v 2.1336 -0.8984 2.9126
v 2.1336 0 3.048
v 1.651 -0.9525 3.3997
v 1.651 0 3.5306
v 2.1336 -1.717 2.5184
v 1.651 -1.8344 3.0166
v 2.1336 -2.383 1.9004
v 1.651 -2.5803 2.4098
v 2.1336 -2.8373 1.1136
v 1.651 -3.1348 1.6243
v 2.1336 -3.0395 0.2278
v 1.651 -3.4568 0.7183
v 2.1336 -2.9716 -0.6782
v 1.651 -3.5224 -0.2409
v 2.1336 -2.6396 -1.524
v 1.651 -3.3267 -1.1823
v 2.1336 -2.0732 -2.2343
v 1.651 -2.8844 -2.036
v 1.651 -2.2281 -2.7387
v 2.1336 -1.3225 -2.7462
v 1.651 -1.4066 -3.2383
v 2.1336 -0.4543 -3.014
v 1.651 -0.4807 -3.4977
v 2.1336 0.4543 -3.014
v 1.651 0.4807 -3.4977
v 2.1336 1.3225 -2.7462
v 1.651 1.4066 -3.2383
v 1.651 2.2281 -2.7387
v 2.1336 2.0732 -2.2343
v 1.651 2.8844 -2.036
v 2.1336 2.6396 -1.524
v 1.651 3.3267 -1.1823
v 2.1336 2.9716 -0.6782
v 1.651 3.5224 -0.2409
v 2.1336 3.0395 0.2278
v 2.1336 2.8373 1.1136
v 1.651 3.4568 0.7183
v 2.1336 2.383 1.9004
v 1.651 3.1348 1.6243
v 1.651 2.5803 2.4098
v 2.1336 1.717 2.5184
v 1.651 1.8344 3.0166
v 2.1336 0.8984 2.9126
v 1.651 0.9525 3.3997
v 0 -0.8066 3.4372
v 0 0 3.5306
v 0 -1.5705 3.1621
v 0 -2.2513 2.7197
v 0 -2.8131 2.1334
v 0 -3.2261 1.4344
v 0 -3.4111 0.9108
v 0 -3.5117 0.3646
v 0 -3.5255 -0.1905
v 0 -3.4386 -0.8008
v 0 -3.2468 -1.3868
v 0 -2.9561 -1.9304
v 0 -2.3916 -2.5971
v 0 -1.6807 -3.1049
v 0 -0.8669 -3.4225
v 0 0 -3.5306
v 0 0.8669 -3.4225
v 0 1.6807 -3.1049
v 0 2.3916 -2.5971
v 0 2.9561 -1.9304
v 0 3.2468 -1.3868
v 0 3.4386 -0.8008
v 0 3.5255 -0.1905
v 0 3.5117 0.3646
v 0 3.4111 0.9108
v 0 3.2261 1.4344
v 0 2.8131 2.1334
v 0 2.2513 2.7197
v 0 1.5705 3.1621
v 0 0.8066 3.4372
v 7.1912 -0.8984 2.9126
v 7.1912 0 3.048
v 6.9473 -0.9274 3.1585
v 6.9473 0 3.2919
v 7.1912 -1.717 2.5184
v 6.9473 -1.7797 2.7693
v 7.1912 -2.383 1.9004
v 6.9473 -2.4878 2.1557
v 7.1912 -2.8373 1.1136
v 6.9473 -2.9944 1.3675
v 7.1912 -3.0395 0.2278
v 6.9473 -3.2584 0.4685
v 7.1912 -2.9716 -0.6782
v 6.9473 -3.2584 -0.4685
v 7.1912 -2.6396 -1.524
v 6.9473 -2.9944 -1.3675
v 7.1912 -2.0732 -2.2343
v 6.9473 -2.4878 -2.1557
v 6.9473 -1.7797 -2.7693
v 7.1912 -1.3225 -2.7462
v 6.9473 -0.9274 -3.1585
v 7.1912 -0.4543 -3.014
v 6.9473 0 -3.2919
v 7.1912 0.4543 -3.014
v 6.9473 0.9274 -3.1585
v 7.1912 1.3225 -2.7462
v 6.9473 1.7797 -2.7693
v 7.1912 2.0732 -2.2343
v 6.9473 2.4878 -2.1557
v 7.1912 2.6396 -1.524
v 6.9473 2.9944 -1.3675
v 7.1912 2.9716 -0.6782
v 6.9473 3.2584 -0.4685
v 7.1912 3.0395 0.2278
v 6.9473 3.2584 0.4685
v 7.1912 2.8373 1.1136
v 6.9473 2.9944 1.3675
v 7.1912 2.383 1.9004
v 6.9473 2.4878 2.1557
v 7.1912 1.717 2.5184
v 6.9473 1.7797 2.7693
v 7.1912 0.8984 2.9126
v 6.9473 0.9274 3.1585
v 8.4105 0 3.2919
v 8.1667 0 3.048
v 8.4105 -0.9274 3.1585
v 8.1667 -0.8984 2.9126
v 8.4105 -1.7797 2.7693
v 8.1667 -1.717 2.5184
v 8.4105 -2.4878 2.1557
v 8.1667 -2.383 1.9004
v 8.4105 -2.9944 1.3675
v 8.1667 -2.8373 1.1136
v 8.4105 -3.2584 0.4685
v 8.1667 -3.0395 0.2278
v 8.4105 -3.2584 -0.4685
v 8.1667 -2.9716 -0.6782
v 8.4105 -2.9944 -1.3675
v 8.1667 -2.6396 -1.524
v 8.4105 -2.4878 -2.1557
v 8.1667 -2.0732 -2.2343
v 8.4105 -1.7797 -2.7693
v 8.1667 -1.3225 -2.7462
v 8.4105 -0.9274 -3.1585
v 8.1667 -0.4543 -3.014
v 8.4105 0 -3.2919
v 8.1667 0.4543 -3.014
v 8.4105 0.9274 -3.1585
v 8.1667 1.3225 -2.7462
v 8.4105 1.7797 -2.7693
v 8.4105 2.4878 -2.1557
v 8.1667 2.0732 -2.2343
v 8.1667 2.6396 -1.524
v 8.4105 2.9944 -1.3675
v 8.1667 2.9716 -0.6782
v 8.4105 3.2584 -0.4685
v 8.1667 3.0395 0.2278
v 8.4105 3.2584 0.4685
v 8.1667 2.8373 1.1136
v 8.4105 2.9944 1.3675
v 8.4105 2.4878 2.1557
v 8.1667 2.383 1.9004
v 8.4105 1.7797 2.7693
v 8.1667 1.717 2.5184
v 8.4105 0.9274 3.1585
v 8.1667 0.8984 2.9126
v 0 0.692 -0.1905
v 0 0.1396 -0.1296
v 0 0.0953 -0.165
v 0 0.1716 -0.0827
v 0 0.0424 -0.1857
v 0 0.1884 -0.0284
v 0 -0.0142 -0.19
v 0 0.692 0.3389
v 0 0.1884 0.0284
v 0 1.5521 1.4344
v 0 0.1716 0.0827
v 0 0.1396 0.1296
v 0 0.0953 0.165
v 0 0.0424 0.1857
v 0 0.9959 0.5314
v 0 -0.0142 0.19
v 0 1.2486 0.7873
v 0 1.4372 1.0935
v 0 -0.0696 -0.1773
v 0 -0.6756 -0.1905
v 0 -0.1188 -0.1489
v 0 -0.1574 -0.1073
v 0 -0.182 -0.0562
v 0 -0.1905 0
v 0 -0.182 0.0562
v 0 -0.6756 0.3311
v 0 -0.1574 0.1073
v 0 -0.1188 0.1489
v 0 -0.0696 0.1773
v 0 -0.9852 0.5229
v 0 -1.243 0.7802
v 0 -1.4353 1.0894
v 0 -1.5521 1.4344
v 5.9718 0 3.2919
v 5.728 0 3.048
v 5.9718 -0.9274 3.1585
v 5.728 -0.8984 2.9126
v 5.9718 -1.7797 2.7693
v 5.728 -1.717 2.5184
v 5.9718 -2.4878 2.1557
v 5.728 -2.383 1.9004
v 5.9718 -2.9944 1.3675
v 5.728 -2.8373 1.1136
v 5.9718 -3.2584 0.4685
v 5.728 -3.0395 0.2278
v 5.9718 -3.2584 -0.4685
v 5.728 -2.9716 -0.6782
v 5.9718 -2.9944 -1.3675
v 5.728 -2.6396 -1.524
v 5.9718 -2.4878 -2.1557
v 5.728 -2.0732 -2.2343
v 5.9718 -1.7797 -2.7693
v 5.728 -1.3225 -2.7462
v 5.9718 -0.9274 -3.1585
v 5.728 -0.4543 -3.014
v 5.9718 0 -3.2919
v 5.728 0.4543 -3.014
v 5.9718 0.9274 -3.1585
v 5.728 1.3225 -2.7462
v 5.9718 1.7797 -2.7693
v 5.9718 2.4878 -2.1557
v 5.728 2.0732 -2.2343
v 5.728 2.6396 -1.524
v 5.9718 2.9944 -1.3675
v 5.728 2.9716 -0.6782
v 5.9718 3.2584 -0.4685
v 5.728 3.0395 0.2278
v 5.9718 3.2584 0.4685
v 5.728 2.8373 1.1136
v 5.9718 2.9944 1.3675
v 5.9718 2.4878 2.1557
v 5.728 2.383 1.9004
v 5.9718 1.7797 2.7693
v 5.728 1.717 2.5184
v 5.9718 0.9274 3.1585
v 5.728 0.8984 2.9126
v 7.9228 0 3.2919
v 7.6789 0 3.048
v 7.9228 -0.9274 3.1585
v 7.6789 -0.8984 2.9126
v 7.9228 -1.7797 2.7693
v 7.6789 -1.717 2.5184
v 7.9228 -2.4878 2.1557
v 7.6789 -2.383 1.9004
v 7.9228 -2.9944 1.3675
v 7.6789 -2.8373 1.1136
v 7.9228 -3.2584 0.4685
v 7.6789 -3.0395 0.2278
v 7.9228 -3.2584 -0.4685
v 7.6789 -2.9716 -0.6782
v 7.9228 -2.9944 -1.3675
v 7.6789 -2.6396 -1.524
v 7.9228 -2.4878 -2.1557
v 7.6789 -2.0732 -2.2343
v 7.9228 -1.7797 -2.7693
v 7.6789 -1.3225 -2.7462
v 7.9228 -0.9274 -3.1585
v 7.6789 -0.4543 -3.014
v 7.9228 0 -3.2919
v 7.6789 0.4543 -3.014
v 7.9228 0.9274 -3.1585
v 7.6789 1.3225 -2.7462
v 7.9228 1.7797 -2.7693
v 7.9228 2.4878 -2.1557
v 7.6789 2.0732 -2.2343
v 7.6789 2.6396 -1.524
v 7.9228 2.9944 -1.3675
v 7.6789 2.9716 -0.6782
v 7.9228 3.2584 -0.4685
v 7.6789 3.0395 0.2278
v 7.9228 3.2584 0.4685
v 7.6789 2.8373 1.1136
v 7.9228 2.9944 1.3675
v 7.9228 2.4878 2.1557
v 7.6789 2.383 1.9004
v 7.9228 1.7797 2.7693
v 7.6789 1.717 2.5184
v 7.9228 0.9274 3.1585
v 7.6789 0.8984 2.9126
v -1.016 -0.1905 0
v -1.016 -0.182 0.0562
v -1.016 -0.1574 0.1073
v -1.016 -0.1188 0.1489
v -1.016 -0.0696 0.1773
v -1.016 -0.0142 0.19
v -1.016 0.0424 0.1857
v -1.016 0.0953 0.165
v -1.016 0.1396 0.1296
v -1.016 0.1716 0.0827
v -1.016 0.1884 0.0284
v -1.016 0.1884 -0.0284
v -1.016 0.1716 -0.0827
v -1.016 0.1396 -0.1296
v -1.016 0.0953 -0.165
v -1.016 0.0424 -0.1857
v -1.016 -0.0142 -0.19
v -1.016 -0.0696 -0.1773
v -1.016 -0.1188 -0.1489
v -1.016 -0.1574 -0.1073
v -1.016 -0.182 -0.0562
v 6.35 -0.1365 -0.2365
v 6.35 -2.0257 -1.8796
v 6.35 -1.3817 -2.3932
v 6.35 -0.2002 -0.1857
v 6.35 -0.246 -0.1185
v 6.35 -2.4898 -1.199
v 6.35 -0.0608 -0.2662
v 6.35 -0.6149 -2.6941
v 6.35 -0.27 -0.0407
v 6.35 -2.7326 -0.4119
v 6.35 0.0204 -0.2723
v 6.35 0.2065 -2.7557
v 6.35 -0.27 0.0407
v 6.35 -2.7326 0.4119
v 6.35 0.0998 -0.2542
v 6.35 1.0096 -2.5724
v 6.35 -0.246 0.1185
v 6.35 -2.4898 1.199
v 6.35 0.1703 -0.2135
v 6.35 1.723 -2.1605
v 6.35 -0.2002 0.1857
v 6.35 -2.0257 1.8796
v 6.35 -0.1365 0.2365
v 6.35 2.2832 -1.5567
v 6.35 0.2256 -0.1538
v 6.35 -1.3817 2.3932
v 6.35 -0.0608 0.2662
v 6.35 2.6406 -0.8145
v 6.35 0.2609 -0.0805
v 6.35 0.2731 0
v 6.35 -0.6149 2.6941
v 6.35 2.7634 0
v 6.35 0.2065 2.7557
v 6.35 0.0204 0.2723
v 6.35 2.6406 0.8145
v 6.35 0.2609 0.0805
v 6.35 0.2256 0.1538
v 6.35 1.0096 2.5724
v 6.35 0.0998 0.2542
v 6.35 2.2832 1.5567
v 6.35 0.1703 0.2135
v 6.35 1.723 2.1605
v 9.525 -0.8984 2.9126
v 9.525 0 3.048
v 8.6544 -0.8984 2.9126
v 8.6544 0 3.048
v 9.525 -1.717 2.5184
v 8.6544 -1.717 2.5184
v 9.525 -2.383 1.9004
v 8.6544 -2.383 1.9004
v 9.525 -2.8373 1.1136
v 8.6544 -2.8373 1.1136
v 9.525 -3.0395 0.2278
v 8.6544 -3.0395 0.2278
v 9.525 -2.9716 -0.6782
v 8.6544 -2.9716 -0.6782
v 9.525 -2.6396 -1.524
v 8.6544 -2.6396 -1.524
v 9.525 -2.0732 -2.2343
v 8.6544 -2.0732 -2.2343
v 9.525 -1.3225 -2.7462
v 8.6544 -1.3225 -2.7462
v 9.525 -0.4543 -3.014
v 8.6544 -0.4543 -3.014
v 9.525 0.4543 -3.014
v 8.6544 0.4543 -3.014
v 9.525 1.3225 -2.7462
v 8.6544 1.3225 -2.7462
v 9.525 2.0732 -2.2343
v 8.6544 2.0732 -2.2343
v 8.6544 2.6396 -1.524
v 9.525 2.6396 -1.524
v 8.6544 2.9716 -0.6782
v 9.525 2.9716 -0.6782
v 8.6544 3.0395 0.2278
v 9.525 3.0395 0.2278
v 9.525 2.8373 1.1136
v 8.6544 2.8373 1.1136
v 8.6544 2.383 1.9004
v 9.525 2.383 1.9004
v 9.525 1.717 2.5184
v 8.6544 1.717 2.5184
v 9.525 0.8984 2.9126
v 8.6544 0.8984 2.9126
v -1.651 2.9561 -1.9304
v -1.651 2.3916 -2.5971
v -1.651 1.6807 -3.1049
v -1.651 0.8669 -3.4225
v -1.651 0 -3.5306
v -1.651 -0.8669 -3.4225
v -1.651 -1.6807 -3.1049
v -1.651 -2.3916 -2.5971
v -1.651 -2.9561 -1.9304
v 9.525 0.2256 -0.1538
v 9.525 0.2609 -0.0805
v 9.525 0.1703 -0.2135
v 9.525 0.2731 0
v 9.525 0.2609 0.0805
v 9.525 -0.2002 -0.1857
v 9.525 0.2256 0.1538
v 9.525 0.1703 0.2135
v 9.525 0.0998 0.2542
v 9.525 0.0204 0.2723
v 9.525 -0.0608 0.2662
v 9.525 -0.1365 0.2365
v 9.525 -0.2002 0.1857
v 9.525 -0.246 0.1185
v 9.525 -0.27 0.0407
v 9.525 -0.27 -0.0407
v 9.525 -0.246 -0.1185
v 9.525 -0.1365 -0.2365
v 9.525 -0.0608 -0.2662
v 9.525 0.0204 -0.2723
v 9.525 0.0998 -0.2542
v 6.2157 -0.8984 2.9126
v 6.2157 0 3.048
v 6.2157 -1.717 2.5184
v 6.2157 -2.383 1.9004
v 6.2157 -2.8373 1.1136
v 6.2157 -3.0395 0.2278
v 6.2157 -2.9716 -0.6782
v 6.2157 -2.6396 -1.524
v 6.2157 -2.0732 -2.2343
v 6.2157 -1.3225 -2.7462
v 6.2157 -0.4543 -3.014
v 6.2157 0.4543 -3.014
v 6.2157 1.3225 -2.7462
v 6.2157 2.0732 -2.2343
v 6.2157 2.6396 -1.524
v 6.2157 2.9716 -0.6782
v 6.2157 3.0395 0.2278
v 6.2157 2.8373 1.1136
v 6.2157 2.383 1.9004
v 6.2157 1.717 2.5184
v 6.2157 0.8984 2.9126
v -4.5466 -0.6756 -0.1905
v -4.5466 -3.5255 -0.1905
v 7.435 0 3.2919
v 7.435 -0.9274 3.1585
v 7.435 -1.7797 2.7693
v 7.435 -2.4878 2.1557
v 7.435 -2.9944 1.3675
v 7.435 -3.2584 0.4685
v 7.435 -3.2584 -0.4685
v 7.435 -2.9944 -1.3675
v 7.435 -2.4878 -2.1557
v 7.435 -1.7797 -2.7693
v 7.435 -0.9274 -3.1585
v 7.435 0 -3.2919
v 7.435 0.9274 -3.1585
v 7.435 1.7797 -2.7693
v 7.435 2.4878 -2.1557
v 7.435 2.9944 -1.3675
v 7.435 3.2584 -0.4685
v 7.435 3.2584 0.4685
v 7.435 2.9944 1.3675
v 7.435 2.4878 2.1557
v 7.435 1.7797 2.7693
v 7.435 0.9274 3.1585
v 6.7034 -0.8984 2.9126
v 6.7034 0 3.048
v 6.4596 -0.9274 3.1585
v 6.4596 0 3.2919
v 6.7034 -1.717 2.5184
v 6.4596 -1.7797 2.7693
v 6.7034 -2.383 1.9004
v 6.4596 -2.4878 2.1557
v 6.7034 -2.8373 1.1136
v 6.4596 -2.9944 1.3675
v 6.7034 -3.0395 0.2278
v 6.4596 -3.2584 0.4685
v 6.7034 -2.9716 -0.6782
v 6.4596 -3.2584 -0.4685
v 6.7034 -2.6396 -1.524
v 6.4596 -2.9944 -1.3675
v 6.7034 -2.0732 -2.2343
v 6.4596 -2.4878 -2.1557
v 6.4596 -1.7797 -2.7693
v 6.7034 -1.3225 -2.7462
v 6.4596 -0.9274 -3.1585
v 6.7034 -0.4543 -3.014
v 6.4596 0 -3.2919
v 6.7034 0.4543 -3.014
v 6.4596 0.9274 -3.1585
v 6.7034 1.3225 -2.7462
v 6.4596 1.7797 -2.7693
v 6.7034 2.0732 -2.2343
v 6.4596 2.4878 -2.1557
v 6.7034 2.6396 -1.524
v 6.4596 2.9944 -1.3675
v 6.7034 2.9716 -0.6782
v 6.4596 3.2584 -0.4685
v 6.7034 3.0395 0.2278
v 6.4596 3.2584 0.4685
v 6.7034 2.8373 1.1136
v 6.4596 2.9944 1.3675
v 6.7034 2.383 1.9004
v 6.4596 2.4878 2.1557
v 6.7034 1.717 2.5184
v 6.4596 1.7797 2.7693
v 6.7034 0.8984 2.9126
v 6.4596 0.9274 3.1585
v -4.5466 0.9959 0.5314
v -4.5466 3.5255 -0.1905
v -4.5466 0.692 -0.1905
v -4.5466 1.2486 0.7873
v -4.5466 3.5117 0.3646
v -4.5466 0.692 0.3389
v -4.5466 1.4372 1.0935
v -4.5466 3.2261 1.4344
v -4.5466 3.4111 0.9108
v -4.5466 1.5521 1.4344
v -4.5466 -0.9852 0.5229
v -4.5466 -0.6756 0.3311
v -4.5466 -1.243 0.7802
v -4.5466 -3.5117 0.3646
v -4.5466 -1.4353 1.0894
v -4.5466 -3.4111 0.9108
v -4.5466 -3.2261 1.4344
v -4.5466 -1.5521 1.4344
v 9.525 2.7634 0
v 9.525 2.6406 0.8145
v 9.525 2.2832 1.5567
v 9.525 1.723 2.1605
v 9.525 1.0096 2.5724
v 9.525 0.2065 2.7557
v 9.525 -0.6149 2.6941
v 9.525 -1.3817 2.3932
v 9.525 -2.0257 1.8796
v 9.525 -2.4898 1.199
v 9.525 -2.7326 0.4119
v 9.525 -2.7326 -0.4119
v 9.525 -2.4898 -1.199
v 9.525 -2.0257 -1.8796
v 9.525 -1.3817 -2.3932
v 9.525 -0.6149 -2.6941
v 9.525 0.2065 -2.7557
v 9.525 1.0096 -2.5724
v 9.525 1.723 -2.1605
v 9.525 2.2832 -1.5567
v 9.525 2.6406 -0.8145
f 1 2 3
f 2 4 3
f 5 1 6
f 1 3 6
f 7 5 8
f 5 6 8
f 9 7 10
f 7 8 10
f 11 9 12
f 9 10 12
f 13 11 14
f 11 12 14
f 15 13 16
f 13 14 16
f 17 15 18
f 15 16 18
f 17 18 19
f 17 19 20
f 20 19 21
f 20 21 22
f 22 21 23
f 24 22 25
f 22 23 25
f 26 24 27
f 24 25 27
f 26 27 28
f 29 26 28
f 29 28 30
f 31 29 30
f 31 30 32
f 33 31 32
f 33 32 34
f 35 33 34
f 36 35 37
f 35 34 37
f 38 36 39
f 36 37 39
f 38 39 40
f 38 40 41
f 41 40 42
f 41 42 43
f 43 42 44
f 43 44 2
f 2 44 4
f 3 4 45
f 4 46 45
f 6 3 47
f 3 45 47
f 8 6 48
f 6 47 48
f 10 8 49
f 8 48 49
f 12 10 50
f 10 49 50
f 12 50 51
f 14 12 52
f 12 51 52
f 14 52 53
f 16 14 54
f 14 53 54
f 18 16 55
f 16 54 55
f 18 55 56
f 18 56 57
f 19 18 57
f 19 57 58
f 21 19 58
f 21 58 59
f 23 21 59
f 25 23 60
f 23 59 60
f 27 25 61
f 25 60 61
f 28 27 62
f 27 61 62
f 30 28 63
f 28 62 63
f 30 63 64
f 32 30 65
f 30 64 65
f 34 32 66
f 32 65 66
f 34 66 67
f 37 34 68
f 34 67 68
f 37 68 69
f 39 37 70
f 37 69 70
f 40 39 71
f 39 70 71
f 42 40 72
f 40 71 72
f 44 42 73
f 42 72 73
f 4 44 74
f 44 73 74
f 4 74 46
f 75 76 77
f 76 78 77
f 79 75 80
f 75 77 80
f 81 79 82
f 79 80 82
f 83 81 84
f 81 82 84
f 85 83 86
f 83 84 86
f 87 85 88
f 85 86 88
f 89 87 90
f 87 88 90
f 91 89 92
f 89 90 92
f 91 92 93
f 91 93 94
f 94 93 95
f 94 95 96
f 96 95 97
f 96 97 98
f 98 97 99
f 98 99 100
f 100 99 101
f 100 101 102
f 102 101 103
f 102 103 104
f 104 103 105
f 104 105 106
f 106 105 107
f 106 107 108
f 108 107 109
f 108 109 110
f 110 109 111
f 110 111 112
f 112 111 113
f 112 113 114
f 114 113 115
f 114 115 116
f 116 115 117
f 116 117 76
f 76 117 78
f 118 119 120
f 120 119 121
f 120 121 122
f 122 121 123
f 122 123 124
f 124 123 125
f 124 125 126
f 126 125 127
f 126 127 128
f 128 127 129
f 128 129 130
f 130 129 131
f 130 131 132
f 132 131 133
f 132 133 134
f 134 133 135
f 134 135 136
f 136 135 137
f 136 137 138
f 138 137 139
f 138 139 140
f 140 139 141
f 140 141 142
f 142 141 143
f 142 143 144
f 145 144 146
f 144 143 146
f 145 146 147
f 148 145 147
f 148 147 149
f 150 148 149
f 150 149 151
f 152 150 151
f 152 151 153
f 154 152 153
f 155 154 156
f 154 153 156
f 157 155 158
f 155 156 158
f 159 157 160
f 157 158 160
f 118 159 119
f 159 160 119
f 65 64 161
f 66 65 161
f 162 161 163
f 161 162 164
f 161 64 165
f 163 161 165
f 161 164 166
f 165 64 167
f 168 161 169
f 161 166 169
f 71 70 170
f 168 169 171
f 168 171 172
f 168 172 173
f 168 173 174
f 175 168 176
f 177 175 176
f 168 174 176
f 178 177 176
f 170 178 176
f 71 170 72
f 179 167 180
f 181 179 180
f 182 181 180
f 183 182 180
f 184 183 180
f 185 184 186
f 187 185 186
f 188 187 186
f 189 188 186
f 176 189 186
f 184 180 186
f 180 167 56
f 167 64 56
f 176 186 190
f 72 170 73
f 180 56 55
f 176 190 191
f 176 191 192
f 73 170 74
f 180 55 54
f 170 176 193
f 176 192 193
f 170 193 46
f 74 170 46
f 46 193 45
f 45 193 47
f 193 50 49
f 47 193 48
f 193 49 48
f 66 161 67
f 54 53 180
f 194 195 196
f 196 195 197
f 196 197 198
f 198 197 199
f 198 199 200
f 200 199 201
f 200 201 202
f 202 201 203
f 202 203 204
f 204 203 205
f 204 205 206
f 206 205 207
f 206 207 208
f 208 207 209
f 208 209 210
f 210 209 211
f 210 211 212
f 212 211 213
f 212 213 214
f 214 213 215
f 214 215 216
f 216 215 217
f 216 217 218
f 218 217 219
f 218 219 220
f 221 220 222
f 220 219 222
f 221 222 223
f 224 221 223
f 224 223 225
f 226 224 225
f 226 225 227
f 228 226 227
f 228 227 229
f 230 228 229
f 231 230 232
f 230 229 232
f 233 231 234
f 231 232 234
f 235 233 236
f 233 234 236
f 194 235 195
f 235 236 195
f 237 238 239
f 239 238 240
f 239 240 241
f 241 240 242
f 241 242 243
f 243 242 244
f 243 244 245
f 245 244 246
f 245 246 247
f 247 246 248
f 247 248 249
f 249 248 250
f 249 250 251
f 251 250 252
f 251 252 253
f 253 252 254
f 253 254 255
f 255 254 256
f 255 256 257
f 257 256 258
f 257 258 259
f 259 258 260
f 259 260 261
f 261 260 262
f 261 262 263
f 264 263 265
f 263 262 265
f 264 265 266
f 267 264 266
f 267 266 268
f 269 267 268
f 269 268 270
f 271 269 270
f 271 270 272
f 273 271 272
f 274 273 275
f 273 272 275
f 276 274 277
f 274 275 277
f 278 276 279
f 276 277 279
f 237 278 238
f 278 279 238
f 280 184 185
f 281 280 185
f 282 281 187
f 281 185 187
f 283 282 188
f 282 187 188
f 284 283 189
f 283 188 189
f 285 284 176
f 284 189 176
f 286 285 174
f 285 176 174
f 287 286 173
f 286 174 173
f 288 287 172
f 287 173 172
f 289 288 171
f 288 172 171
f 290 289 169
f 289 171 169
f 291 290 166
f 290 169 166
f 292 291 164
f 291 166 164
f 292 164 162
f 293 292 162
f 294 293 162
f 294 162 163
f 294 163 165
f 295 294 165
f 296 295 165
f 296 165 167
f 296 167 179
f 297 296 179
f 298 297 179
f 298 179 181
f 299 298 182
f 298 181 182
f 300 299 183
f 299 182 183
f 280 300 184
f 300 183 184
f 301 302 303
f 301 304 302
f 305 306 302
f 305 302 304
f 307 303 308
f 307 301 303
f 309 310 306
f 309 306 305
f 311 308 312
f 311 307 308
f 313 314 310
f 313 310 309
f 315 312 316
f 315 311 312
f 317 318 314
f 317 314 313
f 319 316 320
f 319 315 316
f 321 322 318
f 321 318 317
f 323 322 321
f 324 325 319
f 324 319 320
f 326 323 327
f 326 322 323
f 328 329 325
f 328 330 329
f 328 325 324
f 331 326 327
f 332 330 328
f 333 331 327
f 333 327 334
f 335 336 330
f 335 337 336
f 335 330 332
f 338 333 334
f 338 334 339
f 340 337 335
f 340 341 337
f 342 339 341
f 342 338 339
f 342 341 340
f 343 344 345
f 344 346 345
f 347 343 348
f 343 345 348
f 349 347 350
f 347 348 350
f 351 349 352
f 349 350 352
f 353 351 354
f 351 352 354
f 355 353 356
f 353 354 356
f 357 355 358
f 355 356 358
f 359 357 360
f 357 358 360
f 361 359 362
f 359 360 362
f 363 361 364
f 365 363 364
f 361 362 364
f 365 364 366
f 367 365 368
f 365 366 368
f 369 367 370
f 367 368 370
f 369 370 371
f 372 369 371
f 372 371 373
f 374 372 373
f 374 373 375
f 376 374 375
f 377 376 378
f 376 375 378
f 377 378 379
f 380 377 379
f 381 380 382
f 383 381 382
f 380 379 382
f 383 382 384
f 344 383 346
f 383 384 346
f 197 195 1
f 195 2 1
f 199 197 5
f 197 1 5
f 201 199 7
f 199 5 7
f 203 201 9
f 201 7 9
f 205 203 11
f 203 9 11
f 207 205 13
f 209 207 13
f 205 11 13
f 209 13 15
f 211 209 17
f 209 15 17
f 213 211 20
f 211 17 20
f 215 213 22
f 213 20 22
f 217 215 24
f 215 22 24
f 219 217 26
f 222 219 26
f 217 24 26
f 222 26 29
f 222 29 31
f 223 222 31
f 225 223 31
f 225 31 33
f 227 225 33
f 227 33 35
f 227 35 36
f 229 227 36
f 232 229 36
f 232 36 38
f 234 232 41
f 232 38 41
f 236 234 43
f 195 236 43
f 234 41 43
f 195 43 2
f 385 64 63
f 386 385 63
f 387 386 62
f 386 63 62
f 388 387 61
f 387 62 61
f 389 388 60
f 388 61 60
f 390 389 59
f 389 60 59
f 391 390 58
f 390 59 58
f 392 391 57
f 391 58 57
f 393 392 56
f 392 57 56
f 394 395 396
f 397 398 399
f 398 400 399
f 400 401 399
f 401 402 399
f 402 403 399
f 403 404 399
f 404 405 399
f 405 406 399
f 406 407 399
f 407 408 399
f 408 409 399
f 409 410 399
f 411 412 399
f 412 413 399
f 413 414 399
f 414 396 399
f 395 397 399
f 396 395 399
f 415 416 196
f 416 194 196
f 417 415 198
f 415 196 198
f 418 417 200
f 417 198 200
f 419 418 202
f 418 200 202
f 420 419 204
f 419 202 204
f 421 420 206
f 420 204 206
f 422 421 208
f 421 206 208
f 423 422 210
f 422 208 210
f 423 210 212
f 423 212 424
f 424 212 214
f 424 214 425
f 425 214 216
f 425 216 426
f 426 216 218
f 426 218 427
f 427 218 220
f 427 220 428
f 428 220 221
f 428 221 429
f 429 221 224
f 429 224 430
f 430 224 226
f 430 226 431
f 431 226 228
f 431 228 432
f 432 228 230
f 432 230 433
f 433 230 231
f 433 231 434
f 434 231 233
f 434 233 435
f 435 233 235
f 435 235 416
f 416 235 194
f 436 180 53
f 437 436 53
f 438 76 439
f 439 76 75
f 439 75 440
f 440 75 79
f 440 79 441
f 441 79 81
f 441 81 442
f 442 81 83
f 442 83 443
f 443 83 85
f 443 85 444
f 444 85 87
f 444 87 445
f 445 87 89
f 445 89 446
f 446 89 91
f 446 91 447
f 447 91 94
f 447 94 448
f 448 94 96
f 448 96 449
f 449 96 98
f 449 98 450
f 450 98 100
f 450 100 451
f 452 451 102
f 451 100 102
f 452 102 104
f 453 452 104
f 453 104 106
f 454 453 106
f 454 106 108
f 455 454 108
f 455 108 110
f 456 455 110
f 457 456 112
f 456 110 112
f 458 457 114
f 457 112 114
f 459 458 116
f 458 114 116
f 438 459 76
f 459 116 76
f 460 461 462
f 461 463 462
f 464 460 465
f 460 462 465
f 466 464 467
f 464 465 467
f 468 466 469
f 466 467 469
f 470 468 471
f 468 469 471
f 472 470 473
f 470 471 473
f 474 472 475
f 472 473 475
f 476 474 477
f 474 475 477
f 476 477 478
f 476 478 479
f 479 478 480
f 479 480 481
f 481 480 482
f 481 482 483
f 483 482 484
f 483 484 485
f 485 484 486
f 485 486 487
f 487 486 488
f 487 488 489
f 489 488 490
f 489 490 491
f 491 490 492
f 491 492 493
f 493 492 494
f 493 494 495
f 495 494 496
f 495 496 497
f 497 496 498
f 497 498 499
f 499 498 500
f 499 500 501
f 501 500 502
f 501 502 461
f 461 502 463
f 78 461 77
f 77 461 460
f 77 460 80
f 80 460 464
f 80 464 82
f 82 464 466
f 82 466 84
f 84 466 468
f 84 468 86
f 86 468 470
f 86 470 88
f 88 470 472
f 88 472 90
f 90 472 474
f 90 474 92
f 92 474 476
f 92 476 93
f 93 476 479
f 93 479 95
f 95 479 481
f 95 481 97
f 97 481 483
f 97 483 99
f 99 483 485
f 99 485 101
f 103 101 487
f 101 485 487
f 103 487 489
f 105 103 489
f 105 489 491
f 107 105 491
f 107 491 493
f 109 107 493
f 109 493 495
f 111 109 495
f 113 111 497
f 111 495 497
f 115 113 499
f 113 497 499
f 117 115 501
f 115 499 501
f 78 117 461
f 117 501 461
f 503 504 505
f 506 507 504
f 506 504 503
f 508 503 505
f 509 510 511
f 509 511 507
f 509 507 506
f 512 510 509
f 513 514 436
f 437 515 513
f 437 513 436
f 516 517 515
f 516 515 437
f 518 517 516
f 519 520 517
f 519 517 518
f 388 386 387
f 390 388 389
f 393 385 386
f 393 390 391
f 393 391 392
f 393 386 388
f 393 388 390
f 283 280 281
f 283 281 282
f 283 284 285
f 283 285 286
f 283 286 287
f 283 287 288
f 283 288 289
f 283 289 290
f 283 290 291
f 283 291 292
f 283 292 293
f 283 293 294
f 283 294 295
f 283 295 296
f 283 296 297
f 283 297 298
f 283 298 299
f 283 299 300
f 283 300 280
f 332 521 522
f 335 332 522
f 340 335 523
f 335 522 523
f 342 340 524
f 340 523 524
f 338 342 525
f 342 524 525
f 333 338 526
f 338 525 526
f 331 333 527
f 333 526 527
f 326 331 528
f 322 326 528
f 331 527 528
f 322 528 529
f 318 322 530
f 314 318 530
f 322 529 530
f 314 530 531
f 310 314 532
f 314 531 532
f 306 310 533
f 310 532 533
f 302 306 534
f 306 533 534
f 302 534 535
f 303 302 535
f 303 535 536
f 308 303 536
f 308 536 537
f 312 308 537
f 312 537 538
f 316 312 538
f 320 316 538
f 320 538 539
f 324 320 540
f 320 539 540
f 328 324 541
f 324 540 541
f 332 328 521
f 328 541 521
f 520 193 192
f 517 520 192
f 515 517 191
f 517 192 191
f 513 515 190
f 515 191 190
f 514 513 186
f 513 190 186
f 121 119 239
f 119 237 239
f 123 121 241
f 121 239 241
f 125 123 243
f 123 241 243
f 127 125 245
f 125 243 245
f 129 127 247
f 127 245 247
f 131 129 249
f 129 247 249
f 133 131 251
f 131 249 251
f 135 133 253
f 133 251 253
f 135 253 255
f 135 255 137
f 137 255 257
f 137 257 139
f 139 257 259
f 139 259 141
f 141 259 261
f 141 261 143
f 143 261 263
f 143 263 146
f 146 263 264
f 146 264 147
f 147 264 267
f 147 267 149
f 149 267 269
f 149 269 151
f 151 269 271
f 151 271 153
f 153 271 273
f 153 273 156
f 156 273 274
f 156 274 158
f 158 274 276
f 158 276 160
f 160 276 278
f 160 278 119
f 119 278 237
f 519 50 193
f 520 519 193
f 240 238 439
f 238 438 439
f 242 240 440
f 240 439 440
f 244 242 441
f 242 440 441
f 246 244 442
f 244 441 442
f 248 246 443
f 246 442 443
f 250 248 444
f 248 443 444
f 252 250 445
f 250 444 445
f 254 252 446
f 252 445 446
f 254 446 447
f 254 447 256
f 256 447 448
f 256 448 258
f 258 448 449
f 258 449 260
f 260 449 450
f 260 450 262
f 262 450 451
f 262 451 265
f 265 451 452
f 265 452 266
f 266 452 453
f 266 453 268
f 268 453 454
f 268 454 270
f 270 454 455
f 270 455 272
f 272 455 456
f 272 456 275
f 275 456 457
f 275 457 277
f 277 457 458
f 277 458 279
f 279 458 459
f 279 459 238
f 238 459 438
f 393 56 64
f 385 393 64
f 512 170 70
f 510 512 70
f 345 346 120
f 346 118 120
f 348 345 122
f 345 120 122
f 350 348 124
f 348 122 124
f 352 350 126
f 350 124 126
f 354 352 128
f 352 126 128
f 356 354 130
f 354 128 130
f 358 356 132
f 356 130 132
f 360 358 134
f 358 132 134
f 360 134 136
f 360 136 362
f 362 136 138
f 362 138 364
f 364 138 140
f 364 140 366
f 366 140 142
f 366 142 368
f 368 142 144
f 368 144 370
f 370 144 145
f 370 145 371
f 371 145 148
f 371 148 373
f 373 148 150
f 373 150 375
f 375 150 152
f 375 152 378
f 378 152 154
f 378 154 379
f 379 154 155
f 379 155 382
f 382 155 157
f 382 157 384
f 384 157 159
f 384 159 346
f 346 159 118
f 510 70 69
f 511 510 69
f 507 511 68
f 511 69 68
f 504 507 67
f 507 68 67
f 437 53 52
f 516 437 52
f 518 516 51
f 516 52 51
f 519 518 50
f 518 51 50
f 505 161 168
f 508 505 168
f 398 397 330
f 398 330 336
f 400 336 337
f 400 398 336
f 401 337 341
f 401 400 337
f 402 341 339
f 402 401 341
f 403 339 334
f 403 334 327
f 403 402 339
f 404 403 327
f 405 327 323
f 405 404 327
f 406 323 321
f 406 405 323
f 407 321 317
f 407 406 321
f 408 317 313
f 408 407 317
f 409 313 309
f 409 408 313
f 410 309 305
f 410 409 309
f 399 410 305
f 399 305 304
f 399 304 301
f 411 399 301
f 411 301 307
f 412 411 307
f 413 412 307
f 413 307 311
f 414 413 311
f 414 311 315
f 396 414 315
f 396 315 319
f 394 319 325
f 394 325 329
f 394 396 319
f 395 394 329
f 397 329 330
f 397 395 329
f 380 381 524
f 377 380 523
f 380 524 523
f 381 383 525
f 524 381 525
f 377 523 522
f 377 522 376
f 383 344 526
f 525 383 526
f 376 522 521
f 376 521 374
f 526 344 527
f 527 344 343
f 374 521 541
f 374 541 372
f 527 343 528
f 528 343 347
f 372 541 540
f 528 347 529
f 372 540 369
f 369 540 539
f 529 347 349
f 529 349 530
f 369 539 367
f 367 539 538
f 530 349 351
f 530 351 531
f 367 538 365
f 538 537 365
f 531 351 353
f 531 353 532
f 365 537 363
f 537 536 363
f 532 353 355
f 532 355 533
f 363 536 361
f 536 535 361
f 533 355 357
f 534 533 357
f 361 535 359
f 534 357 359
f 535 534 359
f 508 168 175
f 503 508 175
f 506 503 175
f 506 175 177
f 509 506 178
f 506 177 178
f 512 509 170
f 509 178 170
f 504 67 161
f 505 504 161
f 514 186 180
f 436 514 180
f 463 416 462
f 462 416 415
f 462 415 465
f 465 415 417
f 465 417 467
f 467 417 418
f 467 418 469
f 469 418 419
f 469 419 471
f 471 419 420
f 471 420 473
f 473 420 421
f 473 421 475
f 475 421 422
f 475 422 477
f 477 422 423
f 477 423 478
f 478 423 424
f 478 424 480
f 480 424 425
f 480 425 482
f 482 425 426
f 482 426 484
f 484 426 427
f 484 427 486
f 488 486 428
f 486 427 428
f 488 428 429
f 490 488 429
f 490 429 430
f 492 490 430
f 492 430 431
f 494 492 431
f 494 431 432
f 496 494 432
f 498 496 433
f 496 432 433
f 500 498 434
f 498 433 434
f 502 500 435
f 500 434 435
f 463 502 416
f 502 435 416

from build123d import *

# Parameters (mm, degrees)
F2_R     = 2.7634205328
F2_R_2   = 0.2730680528
F3_DEPTH = 3.175
F4_R     = 0.1905
F5_DEPTH = 1.016
F7_DEPTH = 1.651
F9_DEPTH = 4.5466


# Not quite as in the source:
# - after a boolean that leaves OpenCascade's solid faulty, fix() repairs it


with BuildPart() as f1:
    # F0 (on Front) → F1 (revolve)
    with BuildSketch(Plane.XZ):
        Polygon((0, 3.5306), (0, 0), (9.525, 0), (9.525, 3.048), (8.6543986211, 3.048), (8.4105280196, 3.2918706015), (8.1666574181, 3.048), (7.9227868167, 3.2918706015), (7.6789162152, 3.048), (7.4350456137, 3.2918706015), (7.1911750122, 3.048), (6.9473044108, 3.2918706015), (6.7034338093, 3.048), (6.4595632078, 3.2918706015), (6.2156926063, 3.048), (5.9718220049, 3.2918706015), (5.7279514034, 3.048), (2.1336, 3.048), (1.651, 3.5306), align=None)
    revolve(axis=Axis((4.7625, 0, 0), (1, 0, 0)))

    # F2 (on face) → F3 (cut)
    with BuildSketch(Plane.YZ.offset(9.525)):
        Circle(F2_R)
        Circle(F2_R_2, mode=Mode.SUBTRACT)
    extrude(amount=-F3_DEPTH, mode=Mode.SUBTRACT)

    # F4 (on face) → F5 (join)
    with BuildSketch(Plane(origin=(0, 0, 0), x_dir=(0, -1, 0), z_dir=(-1, 0, 0))):
        Circle(F4_R)
    extrude(amount=F5_DEPTH)

    # F6 (on face) → F7 (join)
    with BuildSketch(Plane(origin=(0, 0, 0), x_dir=(0, -1, 0), z_dir=(-1, 0, 0))):
        with BuildLine():
            ThreePointArc((-2.9561279066, -1.9304), (0, -3.5306), (2.9561279066, -1.9304))
            Line((2.9561279066, -1.9304), (-2.9561279066, -1.9304))
        make_face()
    extrude(amount=F7_DEPTH)

    add(f1.part.fix(), mode=Mode.REPLACE)

    # F8 (on face) → F9 (join)
    with BuildSketch(Plane(origin=(0, 0, 0), x_dir=(0, -1, 0), z_dir=(-1, 0, 0))):
        with BuildLine():
            Line((-1.5521158375, 1.4343592338), (-3.226104454, 1.4343592338))
            ThreePointArc((-3.226104454, 1.4343592338), (-3.4721660307, 0.6396869664), (-3.5254568654, -0.1905))
            Line((-3.5254568654, -0.1905), (-0.6920051213, -0.1905))
            Line((-0.6920051213, -0.1905), (-0.6920051213, 0.3389294034))
            ThreePointArc((-0.6920051213, 0.3389294034), (-1.2486037593, 0.7872849365), (-1.5521158375, 1.4343592338))
        make_face()
        with BuildLine():
            Line((0.6756495639, -0.1905), (3.5254568654, -0.1905))
            ThreePointArc((3.5254568654, -0.1905), (3.4721660307, 0.6396869664), (3.226104454, 1.4343592338))
            Line((3.226104454, 1.4343592338), (1.5521158375, 1.4343592338))
            ThreePointArc((1.5521158375, 1.4343592338), (1.2429873115, 0.7801737537), (0.6756495639, 0.3311225672))
            Line((0.6756495639, 0.3311225672), (0.6756495639, -0.1905))
        make_face()
    extrude(amount=F9_DEPTH)


solid = f1.part
